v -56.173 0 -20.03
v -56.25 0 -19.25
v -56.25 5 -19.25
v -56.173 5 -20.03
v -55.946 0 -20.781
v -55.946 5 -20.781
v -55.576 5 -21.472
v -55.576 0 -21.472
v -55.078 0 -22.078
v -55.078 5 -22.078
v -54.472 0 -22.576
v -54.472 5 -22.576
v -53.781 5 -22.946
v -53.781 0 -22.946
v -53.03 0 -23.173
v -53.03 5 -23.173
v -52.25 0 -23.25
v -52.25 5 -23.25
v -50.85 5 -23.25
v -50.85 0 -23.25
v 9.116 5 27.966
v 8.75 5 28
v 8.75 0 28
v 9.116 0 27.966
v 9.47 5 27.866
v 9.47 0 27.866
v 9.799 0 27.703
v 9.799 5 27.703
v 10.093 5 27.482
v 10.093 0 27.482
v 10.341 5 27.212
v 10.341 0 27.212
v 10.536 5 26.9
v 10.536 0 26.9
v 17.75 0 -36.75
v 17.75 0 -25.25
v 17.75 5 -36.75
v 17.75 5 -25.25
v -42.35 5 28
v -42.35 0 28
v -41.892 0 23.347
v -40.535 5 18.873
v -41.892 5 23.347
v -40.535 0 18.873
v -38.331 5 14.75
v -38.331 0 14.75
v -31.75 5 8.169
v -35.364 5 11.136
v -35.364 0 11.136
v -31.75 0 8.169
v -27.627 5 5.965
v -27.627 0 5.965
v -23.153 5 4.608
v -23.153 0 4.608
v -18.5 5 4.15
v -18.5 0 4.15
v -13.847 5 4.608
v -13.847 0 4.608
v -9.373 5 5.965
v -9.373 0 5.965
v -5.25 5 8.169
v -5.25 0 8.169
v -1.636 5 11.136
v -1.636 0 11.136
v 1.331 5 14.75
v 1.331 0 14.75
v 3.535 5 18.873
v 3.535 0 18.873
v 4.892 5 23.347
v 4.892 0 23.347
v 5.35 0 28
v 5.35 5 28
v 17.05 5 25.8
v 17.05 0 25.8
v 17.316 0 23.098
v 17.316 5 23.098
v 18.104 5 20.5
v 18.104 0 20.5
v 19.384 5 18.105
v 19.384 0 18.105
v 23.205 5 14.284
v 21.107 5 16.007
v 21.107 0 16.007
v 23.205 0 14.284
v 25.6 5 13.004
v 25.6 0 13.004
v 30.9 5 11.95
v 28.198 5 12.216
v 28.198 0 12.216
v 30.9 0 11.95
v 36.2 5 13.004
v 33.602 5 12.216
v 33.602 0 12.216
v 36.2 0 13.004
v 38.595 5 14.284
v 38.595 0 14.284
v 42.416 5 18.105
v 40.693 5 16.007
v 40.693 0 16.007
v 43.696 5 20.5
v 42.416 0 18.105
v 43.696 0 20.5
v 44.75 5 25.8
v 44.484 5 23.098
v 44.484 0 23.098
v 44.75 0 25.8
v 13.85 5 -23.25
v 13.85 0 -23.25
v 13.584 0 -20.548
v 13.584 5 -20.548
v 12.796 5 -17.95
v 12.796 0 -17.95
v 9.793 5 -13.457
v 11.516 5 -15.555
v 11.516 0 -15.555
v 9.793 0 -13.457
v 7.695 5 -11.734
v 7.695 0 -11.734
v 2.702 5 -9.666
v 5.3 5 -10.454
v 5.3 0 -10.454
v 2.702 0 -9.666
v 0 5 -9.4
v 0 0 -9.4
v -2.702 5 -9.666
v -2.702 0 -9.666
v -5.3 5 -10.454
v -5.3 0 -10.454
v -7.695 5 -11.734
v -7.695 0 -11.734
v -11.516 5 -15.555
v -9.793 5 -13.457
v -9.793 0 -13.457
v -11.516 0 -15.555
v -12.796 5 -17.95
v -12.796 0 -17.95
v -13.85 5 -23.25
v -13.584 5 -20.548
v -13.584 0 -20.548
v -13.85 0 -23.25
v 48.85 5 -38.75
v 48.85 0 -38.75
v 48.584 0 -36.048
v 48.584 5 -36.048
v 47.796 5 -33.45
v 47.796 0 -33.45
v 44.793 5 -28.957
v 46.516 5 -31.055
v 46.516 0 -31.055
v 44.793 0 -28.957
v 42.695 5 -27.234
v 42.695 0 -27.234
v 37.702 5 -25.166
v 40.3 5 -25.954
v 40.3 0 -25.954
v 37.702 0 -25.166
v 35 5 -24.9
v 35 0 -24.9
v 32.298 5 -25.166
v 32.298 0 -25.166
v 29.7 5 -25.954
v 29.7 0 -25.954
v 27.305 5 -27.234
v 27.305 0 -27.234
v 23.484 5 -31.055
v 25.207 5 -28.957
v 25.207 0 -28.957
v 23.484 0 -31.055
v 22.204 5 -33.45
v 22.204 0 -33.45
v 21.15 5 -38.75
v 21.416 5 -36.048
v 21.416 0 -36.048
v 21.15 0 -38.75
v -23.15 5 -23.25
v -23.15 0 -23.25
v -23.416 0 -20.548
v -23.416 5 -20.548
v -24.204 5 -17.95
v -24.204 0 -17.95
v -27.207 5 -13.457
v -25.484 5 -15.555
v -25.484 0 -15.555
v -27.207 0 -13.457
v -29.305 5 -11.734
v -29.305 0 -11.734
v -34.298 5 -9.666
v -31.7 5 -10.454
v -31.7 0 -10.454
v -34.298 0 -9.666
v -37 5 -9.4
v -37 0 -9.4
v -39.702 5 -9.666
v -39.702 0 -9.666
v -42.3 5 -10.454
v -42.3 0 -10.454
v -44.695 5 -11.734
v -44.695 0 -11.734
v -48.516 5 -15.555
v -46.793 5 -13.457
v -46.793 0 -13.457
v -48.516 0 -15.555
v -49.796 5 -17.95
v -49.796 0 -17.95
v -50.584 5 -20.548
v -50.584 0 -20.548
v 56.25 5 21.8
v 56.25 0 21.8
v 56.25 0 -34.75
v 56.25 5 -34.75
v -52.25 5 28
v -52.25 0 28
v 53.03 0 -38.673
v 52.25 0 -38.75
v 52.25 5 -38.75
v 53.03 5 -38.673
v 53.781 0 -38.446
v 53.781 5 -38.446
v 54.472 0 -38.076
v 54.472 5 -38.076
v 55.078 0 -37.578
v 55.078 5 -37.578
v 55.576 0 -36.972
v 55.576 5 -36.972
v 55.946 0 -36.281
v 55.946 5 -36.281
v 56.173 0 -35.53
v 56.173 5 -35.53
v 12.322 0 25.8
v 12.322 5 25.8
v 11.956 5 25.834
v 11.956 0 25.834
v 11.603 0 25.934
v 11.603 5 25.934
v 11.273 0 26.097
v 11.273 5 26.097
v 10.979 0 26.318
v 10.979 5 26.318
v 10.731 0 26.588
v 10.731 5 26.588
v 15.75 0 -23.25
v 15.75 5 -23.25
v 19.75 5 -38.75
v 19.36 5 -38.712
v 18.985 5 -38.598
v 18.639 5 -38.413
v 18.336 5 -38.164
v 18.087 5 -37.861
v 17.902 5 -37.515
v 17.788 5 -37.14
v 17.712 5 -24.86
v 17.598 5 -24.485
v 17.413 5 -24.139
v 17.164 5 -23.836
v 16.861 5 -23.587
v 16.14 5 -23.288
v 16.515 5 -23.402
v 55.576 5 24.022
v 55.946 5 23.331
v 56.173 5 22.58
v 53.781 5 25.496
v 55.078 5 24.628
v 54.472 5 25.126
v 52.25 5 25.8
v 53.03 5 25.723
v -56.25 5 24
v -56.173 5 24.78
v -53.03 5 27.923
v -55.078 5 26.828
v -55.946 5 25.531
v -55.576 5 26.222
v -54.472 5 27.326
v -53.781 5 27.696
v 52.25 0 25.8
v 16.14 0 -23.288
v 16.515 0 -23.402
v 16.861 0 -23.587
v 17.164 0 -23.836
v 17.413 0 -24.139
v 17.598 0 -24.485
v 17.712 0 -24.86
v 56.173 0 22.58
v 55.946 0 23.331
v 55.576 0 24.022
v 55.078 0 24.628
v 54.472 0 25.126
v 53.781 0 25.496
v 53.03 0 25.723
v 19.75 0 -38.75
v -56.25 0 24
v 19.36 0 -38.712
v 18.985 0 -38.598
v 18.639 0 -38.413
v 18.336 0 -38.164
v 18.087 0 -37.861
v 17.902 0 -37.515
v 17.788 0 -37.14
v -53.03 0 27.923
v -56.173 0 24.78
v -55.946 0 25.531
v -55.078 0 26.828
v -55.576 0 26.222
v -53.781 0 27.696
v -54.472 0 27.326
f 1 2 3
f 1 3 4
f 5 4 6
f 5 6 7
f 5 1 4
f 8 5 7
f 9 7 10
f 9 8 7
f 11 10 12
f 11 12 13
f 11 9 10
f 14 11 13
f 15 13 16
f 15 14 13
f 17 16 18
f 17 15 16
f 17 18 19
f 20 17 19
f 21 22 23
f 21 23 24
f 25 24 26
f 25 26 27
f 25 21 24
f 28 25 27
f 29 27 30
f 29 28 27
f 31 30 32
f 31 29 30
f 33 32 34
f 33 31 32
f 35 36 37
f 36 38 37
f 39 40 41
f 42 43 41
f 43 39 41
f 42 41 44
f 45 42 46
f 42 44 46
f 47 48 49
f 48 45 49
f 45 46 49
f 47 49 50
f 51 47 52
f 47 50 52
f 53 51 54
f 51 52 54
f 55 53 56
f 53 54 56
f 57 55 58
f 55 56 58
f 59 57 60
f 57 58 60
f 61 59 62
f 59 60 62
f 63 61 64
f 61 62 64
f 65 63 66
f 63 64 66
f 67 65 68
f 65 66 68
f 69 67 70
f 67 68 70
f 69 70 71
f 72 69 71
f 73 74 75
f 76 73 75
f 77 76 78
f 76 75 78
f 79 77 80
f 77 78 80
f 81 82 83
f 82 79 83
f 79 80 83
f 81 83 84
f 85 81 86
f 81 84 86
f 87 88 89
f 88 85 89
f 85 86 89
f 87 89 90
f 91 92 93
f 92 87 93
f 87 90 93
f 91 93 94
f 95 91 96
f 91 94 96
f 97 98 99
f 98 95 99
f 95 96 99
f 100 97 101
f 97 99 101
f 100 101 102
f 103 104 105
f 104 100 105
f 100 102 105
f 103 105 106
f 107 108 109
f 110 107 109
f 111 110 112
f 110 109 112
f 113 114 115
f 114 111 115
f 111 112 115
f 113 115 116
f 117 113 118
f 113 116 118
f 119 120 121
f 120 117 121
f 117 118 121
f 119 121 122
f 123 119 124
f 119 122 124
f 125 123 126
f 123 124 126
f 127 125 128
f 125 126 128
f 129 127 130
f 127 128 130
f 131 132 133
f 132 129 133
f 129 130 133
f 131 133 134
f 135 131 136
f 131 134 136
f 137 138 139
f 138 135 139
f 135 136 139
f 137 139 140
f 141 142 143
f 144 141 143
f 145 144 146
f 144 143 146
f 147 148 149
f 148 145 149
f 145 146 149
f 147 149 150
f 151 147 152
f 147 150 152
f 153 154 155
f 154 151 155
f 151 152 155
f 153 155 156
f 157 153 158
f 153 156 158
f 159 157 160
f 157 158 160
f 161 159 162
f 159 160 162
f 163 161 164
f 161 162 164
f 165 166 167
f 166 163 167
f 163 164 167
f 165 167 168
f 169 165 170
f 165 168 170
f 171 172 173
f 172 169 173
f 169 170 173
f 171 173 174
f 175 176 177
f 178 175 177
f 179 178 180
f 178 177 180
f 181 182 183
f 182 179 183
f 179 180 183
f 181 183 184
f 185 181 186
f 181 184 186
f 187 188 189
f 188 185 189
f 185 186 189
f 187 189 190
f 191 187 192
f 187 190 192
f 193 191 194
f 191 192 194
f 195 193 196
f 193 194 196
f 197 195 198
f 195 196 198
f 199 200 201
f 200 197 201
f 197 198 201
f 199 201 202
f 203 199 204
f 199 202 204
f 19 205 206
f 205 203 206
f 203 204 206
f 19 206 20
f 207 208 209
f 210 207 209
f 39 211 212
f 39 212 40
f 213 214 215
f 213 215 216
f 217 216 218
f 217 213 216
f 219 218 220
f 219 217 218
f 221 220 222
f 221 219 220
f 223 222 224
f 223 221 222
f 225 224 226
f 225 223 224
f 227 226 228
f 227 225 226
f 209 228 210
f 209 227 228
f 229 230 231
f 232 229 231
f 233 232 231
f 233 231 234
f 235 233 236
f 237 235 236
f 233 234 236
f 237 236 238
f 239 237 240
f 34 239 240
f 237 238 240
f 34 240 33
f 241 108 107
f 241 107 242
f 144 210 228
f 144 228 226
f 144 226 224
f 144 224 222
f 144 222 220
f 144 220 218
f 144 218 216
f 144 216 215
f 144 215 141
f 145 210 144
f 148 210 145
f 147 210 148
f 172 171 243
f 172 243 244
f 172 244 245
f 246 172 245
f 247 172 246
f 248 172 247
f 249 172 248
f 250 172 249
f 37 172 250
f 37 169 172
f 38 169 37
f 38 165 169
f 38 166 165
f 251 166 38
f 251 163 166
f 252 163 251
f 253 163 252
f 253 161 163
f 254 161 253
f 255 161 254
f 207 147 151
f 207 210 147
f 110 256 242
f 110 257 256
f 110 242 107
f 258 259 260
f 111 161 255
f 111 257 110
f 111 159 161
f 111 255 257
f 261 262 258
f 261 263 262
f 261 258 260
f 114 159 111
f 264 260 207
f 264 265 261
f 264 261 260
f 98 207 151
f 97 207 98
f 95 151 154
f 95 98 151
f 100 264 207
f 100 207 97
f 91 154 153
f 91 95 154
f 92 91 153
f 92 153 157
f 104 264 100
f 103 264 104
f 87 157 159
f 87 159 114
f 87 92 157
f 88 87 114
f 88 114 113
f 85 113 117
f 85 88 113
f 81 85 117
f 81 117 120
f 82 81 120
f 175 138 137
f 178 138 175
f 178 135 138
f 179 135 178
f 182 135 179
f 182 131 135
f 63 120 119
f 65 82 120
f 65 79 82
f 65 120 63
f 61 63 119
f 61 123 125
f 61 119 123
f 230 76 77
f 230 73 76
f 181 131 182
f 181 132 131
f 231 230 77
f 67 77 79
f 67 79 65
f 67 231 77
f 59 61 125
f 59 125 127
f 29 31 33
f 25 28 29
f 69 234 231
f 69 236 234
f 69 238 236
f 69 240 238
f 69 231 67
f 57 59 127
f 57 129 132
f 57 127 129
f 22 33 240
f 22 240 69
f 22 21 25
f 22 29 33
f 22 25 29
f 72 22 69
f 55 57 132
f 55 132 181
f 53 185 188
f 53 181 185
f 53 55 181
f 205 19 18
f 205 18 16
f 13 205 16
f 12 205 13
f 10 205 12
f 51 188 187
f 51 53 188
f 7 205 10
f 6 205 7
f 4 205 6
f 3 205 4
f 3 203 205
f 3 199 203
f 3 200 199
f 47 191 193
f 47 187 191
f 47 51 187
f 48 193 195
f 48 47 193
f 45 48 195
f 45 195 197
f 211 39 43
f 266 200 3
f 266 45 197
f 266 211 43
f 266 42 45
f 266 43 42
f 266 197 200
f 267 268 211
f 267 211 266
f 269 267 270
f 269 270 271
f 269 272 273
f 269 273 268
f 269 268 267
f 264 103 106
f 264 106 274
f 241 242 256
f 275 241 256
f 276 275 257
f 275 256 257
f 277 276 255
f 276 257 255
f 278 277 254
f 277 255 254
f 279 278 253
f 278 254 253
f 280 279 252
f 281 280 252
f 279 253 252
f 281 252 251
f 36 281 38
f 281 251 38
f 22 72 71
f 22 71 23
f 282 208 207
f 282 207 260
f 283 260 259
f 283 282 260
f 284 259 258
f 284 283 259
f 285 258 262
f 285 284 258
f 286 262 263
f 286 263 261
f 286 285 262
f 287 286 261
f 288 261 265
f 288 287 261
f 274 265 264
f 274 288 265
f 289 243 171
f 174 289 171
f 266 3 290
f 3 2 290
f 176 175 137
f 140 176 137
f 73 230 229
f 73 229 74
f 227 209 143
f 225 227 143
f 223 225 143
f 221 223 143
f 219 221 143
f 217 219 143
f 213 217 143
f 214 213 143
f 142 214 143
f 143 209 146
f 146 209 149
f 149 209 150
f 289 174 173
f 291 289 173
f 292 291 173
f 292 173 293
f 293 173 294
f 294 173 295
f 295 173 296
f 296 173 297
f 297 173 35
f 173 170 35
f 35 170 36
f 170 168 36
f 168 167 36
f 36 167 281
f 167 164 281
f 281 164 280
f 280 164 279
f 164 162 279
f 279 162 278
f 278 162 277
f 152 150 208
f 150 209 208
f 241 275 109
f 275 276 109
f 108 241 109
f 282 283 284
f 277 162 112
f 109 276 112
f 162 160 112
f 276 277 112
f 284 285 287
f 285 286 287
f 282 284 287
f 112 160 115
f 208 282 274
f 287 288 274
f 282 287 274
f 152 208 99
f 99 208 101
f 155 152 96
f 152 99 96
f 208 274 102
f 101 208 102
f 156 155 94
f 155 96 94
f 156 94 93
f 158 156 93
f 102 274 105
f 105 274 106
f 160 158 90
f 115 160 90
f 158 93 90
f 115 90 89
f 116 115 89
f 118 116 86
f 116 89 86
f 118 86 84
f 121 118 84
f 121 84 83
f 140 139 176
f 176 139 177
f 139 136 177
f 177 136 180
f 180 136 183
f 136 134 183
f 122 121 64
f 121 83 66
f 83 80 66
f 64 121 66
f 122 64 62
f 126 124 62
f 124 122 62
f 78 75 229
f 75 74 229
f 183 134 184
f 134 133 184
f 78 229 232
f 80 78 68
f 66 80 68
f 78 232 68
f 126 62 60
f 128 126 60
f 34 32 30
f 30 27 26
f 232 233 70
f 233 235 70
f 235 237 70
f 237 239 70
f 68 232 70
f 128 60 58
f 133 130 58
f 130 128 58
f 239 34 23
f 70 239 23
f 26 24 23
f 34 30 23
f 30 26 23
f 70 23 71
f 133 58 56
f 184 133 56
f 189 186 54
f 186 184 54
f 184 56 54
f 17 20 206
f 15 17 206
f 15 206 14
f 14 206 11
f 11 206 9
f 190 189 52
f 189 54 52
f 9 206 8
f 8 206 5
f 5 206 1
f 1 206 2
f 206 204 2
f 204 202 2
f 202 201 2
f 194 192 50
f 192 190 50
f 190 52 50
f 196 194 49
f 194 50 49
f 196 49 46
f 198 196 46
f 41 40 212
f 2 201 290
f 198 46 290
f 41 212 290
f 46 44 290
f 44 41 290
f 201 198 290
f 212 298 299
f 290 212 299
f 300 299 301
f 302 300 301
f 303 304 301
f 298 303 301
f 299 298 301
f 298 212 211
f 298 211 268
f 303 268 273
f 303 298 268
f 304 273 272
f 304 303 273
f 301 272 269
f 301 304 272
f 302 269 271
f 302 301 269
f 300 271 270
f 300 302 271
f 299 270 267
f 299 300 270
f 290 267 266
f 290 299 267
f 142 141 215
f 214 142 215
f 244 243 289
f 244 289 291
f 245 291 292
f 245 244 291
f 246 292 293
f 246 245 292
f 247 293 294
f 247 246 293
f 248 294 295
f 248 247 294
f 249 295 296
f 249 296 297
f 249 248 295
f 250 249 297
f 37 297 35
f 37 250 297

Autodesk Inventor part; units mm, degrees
ref_plane "YZ Plane" through (0, 0, 0) normal (1, 0, 0) x (0, 1, 0)
ref_plane "XZ Plane" through (0, 0, 0) normal (0, 1, 0) x (-1, 0, 0)
ref_plane "XY Plane" through (0, 0, 0) normal (0, 0, 1) x (1, 0, 0)
sketch "Sketch1" plane through (0, 0, 0) normal (0, 1, 0) x (-1, 0, 0)
  circle A0 centre (18.5, 28) radius 23.85
  circle A1 centre (37, -23.25) radius 13.85
  circle A2 centre (-35, -38.75) radius 13.85
  circle A3 centre (-30.9, 25.8) radius 13.85
  circle A4 centre (0, -23.25) radius 13.85
  line L0 (56.25, 58.25) -> (-56.25, 58.25)
  line L1 (-56.25, -58.25) -> (56.25, -58.25)
  line L2 (0, -105.9299) -> (0, 123.2086) construction
  line L3 (-76.4777, -38.75) -> (-5.35, -38.75) construction
  line L4 (-123.5447, -23.25) -> (82.5572, -23.25) construction
  line L5 (56.25, -58.25) -> (56.25, 58.25)
  line L6 (56.25, 58.25) -> (56.25, -58.25)
  line L7 (-56.25, 58.25) -> (-56.25, -58.25)
  line L8 (100.0459, 28) -> (-13.85, 28) construction
  line L9 (-9.7154, 25.8) -> (-68.4996, 25.8) construction
  line L10 (18.5, 82.6038) -> (18.5, -4.654) construction
  line L11 (-30.9, 82.6038) -> (-30.9, 8.6393) construction
  point P0 (0, 0)
  point P1 (0, 0)
  dimension "d0" = 47.7
  dimension "d1" = 27.7
  dimension "d2" = 27.7
  dimension "d3" = 27.7
  dimension "d4" = 27.7
  dimension "d7" = 37
  dimension "d9" = 30.9
  dimension "d10" = 19.5
  dimension "d11" = 35
  dimension "d12" = 35
  dimension "d13" = 25.8
  dimension "d14" = 28
  dimension "d15" = 56.25
  dimension "d16" = 58.25
  dimension "d17" = 116.5
  dimension "d18" = 112.5
  dimension "d19" = 18.5
  dimension "d20" = 32.45
extrude "Extrusion1" add sketch "Sketch1" along normal blind 5
sketch "Sketch2" plane through (0, 5, 0) normal (0, 1, 0) x (1, 0, 0)
  line L0 (-56.25, 58.25) -> (-56.25, -58.25) projected
  line L1 (-56.25, -58.25) -> (56.25, -58.25) projected
  line L2 (56.25, -58.25) -> (56.25, 58.25) projected
  line L3 (56.25, 58.25) -> (-56.25, 58.25) projected
  circle A0 centre (0, 23.25) radius 13.85 projected
  circle A1 centre (30.9, -25.8) radius 13.85 projected
  circle A2 centre (35, 38.75) radius 13.85 projected
  circle A3 centre (-37, 23.25) radius 13.85 projected
  circle A4 centre (-18.5, -28) radius 23.85 projected
  line L4 (-56.25, 58.25) -> (-56.25, -58.25) projected
  line L5 (-56.25, 23.25) -> (15.75, 23.25)
  line L6 (19.75, 38.75) -> (56.25, 38.75)
  line L7 (56.25, -58.25) -> (56.25, 58.25) projected
  line L8 (17.75, 25.25) -> (17.75, 36.75)
  arc A5 (15.75, 23.25) -> (17.75, 25.25) centre (15.75, 25.25) ccw
  arc A6 (19.75, 38.75) -> (17.75, 36.75) centre (19.75, 36.75) ccw
  point P0 (0, 0)
  point P1 (17.75, 23.25)
  point P2 (17.75, 38.75)
  point P3 (-50.85, 23.25)
  point P4 (-23.15, 23.25)
  point P5 (-13.85, 23.25)
  point P6 (13.85, 23.25)
  point P7 (21.15, 38.75)
  point P8 (48.85, 38.75)
  dimension "d23" = 74
  dimension "d25" = 38.5
  dimension "d26" = 2
  dimension "d27" = 35
  dimension "d28" = 19.5
sketch "Sketch3" plane through (0, 5, 0) normal (0, 1, 0) x (1, 0, 0)
  line L0 (-56.25, -28) -> (8.75, -28)
  line L1 (12.3221, -25.8) -> (56.25, -25.8)
  line L2 (-56.25, 58.25) -> (-56.25, -58.25) projected
  line L3 (-56.25, -58.25) -> (56.25, -58.25) projected
  line L4 (56.25, -58.25) -> (56.25, 58.25) projected
  line L5 (56.25, 58.25) -> (-56.25, 58.25) projected
  circle A0 centre (0, 23.25) radius 13.85 projected
  circle A1 centre (30.9, -25.8) radius 13.85 projected
  circle A2 centre (35, 38.75) radius 13.85 projected
  circle A3 centre (-37, 23.25) radius 13.85 projected
  circle A4 centre (-18.5, -28) radius 23.85 projected
  line L6 (56.25, -58.25) -> (56.25, 58.25) projected
  line L7 (-56.25, 58.25) -> (-56.25, -58.25) projected
  line L8 (10.75, -26) -> (10.75, -25.8)
  arc A5 (8.75, -28) -> (10.5361, -26.9) centre (8.75, -26) ccw
  arc A6 (12.3221, -25.8) -> (10.5361, -26.9) centre (12.3221, -27.8) ccw
  point P0 (0, 0)
  point P1 (10.75, -28)
  point P2 (44.75, -25.8)
  point P3 (17.05, -25.8)
  point P4 (5.35, -28)
  point P5 (-42.35, -28)
  dimension "d29" = 67
  dimension "d30" = 2
extrude "Extrusion2" cut sketch "Sketch3" against normal blind 10 contours L0 A5 A6 L1 A1 L4 L3 L2 A4
extrude "Extrusion3" cut sketch "Sketch2" against normal through all contours L3 L2 L6 A2 A6 L8 A5 L5 A0 A3 L0
fillet "Fillet1" radius 4 4 edges at (-56.25, 2.5, -23.25) (-56.25, 2.5, 28) (56.25, 2.5, 25.8) (56.25, 2.5, -38.75)
properties part number "Top Bottle Middle"
